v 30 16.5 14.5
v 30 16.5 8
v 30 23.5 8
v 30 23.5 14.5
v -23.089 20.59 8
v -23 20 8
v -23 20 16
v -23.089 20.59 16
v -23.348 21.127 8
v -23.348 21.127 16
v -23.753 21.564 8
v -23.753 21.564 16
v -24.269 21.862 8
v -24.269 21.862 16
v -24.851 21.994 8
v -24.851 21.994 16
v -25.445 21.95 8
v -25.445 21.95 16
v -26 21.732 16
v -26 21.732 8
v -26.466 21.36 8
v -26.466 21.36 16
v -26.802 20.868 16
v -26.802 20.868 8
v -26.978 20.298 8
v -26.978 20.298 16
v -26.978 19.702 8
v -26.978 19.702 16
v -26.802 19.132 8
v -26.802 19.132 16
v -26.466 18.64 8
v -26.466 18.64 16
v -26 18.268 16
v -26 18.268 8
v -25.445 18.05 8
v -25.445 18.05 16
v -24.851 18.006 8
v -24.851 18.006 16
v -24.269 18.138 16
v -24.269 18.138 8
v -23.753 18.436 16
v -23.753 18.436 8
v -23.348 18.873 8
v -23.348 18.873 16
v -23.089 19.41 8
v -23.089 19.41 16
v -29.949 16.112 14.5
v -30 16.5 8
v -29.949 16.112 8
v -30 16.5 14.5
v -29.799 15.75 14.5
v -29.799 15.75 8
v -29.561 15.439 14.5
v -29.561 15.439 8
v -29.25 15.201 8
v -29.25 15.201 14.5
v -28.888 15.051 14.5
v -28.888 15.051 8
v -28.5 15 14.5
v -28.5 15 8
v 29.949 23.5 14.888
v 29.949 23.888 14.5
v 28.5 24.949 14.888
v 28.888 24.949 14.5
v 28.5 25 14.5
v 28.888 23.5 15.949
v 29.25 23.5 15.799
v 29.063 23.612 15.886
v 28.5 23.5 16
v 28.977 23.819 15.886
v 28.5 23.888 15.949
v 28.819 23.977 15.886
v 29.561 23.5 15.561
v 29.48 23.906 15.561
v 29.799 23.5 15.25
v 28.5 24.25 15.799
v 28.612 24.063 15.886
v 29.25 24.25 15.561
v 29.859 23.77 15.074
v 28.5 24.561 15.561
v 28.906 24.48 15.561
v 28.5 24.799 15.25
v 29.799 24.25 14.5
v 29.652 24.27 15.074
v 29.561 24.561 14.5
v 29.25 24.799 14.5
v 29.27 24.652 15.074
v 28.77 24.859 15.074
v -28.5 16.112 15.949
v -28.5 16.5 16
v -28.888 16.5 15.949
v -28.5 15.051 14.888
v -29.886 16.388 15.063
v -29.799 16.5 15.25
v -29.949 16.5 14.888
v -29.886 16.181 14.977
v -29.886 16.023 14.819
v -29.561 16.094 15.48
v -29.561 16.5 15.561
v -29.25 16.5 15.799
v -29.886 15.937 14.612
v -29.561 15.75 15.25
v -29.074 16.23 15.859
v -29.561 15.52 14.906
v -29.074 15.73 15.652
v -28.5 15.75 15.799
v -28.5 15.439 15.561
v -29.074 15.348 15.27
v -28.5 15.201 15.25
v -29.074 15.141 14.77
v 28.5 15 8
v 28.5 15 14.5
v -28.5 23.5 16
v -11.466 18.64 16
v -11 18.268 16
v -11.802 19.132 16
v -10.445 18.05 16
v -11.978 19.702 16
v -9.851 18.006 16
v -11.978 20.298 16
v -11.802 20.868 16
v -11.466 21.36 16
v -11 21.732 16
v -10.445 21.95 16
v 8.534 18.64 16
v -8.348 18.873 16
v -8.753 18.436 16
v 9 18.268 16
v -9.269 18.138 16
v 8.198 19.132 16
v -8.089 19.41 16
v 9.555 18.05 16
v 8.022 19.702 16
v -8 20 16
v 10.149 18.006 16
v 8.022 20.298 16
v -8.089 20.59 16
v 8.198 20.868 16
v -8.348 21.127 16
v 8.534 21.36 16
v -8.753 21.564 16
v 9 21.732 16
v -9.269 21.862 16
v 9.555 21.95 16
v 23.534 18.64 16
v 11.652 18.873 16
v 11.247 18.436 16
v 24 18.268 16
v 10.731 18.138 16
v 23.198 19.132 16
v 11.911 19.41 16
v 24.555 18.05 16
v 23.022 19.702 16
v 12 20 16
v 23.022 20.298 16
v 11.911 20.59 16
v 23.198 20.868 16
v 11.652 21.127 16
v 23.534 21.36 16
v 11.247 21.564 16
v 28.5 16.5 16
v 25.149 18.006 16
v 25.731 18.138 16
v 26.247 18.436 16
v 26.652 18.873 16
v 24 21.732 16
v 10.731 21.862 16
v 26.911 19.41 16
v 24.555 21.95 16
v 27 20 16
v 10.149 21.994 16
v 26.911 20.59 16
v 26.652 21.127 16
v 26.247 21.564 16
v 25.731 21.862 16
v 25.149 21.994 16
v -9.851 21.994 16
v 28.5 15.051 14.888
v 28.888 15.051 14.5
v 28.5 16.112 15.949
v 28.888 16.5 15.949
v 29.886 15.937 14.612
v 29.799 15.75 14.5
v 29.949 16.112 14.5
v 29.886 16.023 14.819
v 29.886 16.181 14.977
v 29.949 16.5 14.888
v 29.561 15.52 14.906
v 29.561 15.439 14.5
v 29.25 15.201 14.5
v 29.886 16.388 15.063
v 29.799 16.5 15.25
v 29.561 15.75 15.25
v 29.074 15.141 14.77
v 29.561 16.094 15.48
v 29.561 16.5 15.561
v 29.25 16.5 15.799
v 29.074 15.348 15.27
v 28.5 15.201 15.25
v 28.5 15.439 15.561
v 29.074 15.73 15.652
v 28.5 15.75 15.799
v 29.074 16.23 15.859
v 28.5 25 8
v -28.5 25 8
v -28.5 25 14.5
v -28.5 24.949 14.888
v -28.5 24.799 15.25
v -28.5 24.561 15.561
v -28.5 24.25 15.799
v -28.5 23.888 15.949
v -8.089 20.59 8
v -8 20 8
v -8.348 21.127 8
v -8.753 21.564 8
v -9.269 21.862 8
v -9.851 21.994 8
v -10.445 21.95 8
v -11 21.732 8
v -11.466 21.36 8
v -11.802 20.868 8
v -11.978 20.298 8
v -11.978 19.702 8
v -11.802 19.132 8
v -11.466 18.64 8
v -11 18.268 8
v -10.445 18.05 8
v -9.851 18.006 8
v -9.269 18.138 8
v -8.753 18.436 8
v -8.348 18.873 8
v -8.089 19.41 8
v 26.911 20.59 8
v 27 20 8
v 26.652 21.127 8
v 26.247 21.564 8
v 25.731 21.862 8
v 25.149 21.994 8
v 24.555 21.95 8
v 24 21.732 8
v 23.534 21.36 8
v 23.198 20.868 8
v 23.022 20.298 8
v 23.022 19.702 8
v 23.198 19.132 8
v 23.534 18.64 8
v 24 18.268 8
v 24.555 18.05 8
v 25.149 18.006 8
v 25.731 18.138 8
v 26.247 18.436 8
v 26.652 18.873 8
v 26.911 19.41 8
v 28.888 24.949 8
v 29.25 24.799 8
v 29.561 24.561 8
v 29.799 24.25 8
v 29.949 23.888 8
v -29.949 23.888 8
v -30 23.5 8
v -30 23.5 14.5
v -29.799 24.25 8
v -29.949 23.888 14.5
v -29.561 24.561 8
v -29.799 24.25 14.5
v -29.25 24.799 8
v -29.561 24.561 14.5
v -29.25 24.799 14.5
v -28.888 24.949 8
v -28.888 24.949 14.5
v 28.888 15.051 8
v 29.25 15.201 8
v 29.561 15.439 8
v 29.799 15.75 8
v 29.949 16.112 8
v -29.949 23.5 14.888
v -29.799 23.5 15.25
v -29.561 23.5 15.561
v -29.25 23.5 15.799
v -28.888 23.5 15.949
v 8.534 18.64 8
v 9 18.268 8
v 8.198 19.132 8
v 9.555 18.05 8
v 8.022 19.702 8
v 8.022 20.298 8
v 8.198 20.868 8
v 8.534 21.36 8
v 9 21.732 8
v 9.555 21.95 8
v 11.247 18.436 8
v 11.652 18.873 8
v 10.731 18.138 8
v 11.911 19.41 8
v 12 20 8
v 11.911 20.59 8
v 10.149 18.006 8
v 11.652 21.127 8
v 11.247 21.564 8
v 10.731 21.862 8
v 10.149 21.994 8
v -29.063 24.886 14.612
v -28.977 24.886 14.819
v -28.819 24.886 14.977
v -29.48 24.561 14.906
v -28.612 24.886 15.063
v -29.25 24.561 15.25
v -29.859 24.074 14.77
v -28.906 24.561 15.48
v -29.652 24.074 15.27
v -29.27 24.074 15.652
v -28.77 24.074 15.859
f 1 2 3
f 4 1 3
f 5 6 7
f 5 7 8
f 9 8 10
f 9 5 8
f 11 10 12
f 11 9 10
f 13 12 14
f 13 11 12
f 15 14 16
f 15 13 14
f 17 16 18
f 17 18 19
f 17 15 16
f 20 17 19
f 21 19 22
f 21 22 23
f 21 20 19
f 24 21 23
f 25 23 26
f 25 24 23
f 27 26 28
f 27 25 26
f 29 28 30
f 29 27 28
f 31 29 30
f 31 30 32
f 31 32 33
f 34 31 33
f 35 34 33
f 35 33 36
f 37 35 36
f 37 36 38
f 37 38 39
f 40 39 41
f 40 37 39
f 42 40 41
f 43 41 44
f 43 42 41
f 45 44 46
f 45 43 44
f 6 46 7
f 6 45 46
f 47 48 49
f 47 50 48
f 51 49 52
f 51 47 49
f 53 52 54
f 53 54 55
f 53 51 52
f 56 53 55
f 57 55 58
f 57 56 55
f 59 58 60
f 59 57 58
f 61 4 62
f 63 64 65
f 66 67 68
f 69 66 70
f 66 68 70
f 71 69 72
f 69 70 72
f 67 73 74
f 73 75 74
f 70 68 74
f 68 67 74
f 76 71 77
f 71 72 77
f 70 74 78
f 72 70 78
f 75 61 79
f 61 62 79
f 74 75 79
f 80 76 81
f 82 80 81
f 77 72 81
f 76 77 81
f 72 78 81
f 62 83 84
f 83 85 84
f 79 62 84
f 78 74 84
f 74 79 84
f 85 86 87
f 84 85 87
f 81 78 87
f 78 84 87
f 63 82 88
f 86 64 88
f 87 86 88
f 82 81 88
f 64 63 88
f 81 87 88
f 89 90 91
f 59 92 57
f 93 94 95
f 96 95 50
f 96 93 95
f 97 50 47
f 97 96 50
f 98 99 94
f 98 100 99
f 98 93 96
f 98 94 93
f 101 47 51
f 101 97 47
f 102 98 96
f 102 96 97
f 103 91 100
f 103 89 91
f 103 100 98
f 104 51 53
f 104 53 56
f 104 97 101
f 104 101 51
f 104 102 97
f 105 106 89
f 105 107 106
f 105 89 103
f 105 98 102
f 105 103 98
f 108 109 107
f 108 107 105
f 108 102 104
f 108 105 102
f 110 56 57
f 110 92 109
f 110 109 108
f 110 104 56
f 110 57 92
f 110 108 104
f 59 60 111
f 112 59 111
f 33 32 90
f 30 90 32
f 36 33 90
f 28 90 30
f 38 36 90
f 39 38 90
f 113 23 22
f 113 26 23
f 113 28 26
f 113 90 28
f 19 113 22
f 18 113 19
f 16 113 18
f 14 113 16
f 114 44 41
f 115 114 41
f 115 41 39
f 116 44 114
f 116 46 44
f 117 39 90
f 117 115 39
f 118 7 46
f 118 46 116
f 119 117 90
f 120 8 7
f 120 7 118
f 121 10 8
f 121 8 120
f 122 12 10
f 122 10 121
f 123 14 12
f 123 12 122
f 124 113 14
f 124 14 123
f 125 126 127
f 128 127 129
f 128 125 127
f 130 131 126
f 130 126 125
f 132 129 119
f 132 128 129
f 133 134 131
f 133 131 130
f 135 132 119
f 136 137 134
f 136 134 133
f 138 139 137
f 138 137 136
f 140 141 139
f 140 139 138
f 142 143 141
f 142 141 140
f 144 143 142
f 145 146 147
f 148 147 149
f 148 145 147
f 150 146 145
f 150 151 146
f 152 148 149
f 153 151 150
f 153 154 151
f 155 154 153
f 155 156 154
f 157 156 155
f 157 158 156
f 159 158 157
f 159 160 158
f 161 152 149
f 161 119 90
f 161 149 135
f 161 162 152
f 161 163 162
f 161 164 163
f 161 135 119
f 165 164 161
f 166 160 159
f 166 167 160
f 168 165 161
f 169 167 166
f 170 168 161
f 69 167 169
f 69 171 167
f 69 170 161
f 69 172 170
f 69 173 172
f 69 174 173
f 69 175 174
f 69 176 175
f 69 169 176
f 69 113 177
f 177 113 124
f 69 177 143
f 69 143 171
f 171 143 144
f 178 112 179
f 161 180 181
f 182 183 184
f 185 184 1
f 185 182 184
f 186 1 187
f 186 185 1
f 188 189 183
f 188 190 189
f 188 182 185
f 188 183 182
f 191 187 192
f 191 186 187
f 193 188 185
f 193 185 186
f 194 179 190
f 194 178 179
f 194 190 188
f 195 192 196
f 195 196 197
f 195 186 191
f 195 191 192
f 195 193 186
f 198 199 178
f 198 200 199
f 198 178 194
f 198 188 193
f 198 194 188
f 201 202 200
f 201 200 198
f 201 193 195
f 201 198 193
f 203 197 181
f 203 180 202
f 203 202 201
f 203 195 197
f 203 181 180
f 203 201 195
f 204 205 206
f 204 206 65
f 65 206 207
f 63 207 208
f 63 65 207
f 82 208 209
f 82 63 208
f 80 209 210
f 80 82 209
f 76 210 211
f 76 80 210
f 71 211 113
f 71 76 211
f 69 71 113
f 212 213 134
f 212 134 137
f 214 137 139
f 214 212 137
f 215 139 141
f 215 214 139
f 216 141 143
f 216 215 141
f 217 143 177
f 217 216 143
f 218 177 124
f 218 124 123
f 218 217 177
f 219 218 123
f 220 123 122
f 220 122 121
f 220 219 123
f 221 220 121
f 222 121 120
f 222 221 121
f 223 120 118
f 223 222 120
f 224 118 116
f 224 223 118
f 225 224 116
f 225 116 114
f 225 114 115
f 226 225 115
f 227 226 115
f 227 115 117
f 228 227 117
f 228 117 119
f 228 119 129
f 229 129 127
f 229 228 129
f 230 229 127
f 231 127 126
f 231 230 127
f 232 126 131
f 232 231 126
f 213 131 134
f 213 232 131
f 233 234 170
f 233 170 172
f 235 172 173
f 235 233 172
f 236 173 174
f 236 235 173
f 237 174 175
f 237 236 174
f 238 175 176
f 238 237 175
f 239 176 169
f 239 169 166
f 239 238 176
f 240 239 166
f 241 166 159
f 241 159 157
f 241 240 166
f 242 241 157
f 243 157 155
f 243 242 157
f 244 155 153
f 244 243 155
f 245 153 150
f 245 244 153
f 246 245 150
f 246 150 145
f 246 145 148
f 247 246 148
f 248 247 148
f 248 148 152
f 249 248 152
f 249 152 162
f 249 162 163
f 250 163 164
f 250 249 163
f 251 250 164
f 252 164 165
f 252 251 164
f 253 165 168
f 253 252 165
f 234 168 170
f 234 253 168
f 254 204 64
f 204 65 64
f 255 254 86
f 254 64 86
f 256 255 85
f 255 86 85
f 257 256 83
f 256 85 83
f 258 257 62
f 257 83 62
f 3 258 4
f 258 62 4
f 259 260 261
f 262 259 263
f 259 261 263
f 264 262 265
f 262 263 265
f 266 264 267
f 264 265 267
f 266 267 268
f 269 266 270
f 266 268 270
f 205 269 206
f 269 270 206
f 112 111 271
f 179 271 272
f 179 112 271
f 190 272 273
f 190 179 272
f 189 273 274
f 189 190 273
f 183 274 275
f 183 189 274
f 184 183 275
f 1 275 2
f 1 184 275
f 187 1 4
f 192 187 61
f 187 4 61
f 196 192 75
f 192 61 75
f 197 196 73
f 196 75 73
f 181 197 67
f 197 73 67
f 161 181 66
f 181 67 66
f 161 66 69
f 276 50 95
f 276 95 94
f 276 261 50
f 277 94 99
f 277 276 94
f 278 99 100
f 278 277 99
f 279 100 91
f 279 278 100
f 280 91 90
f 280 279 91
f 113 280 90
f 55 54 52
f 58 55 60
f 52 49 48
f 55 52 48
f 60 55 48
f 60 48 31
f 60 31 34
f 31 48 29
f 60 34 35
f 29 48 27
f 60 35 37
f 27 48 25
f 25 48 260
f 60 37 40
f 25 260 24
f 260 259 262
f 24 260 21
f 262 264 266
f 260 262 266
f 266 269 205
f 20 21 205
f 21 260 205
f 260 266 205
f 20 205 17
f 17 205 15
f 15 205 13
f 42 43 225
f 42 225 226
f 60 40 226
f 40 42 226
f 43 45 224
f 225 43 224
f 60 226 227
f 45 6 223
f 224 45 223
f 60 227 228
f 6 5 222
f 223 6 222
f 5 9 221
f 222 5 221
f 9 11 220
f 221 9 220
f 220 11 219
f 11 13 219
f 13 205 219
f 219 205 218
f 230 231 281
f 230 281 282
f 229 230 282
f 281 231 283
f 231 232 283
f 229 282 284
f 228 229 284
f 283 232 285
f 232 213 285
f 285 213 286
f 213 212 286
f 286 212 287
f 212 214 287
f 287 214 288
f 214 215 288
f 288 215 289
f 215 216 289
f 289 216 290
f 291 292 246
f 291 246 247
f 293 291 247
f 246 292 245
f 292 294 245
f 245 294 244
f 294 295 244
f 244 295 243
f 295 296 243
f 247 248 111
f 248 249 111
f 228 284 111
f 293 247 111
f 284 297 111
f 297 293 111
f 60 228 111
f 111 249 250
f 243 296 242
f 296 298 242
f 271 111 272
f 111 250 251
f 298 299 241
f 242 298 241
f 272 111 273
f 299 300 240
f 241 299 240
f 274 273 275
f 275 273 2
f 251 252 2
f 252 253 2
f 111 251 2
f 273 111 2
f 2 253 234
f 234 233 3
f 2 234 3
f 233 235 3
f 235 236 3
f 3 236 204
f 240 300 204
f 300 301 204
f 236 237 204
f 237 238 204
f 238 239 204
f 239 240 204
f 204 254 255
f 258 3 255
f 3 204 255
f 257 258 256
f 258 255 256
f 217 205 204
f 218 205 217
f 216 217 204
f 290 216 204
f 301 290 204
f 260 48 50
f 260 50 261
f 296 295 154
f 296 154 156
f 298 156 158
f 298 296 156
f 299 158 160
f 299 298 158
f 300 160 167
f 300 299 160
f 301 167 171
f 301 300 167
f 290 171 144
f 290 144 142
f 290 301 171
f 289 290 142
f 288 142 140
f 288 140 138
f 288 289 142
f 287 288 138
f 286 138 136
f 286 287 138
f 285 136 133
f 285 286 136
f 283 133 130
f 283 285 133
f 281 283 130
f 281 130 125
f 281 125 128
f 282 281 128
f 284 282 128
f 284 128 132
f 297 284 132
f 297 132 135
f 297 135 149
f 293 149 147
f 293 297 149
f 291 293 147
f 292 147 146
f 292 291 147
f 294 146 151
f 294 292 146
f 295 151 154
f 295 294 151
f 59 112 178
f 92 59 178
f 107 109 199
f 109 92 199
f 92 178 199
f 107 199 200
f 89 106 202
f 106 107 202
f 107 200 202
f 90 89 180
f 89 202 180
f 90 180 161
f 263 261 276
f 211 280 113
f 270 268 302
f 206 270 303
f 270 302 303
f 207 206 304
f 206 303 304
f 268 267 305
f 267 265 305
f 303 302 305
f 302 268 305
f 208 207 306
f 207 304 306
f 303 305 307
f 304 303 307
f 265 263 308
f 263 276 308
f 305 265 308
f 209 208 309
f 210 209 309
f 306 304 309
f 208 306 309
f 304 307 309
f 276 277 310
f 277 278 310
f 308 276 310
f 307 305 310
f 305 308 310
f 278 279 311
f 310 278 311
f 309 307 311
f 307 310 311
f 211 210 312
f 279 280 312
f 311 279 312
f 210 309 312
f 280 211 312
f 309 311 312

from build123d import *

# Parameters (mm, degrees)
F0_R      = 2
F1_DEPTH  = 10
F2_R      = 5
F4_R      = 2
F5_DEPTH  = 10
F7_R      = 5
F7_2_R    = 5
F8_R      = 2
F8_2_R    = 2
F10_DEPTH = 25
F11_R     = 1.5
F12_R     = 1.75
F13_DEPTH = 12.5
F15_W     = 9
F15_H     = 20
F16_DEPTH = 10
F17_W     = 6
F17_H     = 20
F18_DEPTH = 25
F21_R     = 2
F22_DEPTH = 30
F24_R     = 2
F25_DEPTH = 12.5
F27_R     = 2
F28_R     = 2
F29_DEPTH = 8
F30_R     = 2
F31_R     = 2
F32_R     = 1.75
F33_DEPTH = 25
F32_R_2   = 2
F37_ANGLE = 90
F40_W     = 60
F40_H     = 10
F40_R     = 2
F41_DEPTH = 8
F43_R     = 1.5


with BuildPart() as f1:
    # F0 (on Top) → F1 (new body)
    with BuildSketch(Plane.XY):
        Polygon((0, 70), (0, 75), (-20, 75), (-30, 75), (-50, -75), (-40, -75), (0, -75), (0, -65), (-38.6666666667, -65), (-30.8, -6), (0, -6), (0, 0), (0, 6), (-29.2, 6), (-21.3333333333, 65), (0, 65), align=None)
        with Locations((-15, 0)):
            Circle(F0_R, mode=Mode.SUBTRACT)
        with Locations((-10.4101235047, 70)):
            Circle(F0_R, mode=Mode.SUBTRACT)
    extrude(amount=F1_DEPTH)

    # F2
    f2_edges = [f1.edges().sort_by_distance(p)[0] for p in [
        (-21.333333, 65, 5),
        (-30.8, -6, 5),
        (-29.2, 6, 5),
        (-38.666667, -65, 5),
        (-50, -75, 5),
    ]]
    fillet(f2_edges, radius=F2_R)

    # F3: F1 across plane


with BuildPart() as f1_1:
    add(f1.part)
    add(f1.part.mirror(Plane.YZ))

    # F4 (on Top) → F5 (join)
    with BuildSketch(Plane.XY):
        with BuildLine():
            Line((0, 80), (0, 75))
            Line((0, 75), (10, 75))
            Line((10, 75), (30, 75))
            Line((30, 75), (13.3333333333, 200))
            Line((13.3333333333, 200), (4.5, 200))
            Line((4.5, 200), (4.5, 192))
            ThreePointArc((4.5, 192), (3.1819805153, 188.8180194847), (0, 187.5))
            Line((0, 187.5), (0, 170.1721444783))
            Line((0, 170.1721444783), (7.3103807362, 170.1721444783))
            Line((7.3103807362, 170.1721444783), (10, 150))
            Line((10, 150), (18.6666666667, 85))
            Line((18.6666666667, 85), (10, 85))
            Line((10, 85), (0, 85))
            Line((0, 85), (0, 80))
        make_face()
        with Locations((10, 80)):
            Circle(F4_R, mode=Mode.SUBTRACT)
    extrude(amount=F5_DEPTH)


with BuildPart() as f6_1:
    # F6: instance of F1
    add(f1_1.part.mirror(Plane.YZ))

    # F7
    f7_edges = [f6_1.edges().sort_by_distance(p)[0] for p in [
        (-7.310381, 170.172144, 5),
        (-18.666667, 85, 5),
        (-13.333333, 200, 5),
    ]]
    fillet(f7_edges, radius=F7_R)

    # F8#2
    f8_2_edges = [f6_1.edges().sort_by_distance(p)[0] for p in [
        (-4.5, 200, 5),
    ]]
    fillet(f8_2_edges, radius=F8_2_R)


with BuildPart() as f1_2:
    add(f1_1.part)

    # F7#2
    f7_2_edges = [f1_2.edges().sort_by_distance(p)[0] for p in [
        (7.310381, 170.172144, 5),
        (18.666667, 85, 5),
        (13.333333, 200, 5),
    ]]
    fillet(f7_2_edges, radius=F7_2_R)

    # F8
    f8_edges = [f1_2.edges().sort_by_distance(p)[0] for p in [
        (4.5, 200, 5),
    ]]
    fillet(f8_edges, radius=F8_R)

    add(f6_1.part)  # F10 merges F6_1
    # F9 (on Top) → F10 (join)
    with BuildSketch(Plane.XY):
        Polygon((0, -6), (0, 0), (0, 6), (-6, 6), (-6, -6), align=None)
    extrude(amount=F10_DEPTH)

    # F11
    f11_edges = [f1_2.edges().sort_by_distance(p)[0] for p in [
        (-6, -6, 17.5),
        (-6, 0, 25),
        (-3, -6, 25),
        (-6, 6, 17.5),
        (-3, 6, 25),
    ]]
    fillet(f11_edges, radius=F11_R)


with BuildPart() as f13:
    # F12 (on Right) → F13 (new body, symmetric)
    with BuildSketch(Plane.YZ):
        with Locations((0, 20)):
            Circle(F12_R)
    extrude(amount=F13_DEPTH, both=True)


with BuildPart() as f13b:
    # F12 (on Right) → F13, piece 2 (new body, symmetric)
    with BuildSketch(Plane.YZ):
        with Locations((0, 15)):
            Circle(F12_R)
    extrude(amount=F13_DEPTH, both=True)


with BuildPart() as f1_3:
    add(f1_2.part)

    # F14: cut F13b, F13
    add(f13b.part, mode=Mode.SUBTRACT)
    add(f13.part, mode=Mode.SUBTRACT)


with BuildPart() as f16:
    # F15 (on Top) → F16 (new body)
    with BuildSketch(Plane.XY):
        Polygon((0, 65), (15, 65), (15, 85), (0, 85), (0, 75), align=None)
        Polygon((-6, 65), (0, 65), (0, 75), (0, 85), (-6, 85), align=None)
        with Locations((-10.5, 75)):
            Rectangle(F15_W, F15_H)
    extrude(amount=F16_DEPTH)


with BuildPart() as f18:
    # F17 (on Top) → F18 (new body)
    with BuildSketch(Plane.XY):
        with Locations((-3, 75)):
            Rectangle(F17_W, F17_H)
    extrude(amount=F18_DEPTH)


with BuildPart() as f16_1:
    add(f16.part)

    # F19: union F18
    add(f18.part)


with BuildPart() as f16_2:
    # F20: moved
    add(f16_1.part.moved(Location((0, 0, 10))))


with BuildPart() as f22:
    # F21 (on Top) → F22 (new body)
    with BuildSketch(Plane.XY):
        with Locations((-10, 80)):
            Circle(F21_R)
    extrude(amount=F22_DEPTH)


with BuildPart() as f22b:
    # F21 (on Top) → F22, piece 2 (new body)
    with BuildSketch(Plane.XY):
        with Locations((10, 80)):
            Circle(F21_R)
    extrude(amount=F22_DEPTH)


with BuildPart() as f22c:
    # F21 (on Top) → F22, piece 3 (new body)
    with BuildSketch(Plane.XY):
        with Locations((-10.4, 70)):
            Circle(F21_R)
    extrude(amount=F22_DEPTH)


with BuildPart() as f22d:
    # F21 (on Top) → F22, piece 4 (new body)
    with BuildSketch(Plane.XY):
        with Locations((10.4, 70)):
            Circle(F21_R)
    extrude(amount=F22_DEPTH)


with BuildPart() as f16_3:
    add(f16_2.part)

    # F23: cut F22d, F22c, F22b, F22
    add(f22d.part, mode=Mode.SUBTRACT)
    add(f22c.part, mode=Mode.SUBTRACT)
    add(f22b.part, mode=Mode.SUBTRACT)
    add(f22.part, mode=Mode.SUBTRACT)


with BuildPart() as f25:
    # F24 (on Right) → F25 (new body, symmetric)
    with BuildSketch(Plane.YZ):
        with Locations((80, 27.2266920656)):
            Circle(F24_R)
    extrude(amount=F25_DEPTH, both=True)


with BuildPart() as f25b:
    # F24 (on Right) → F25, piece 2 (new body, symmetric)
    with BuildSketch(Plane.YZ):
        with Locations((70, 27.2266920656)):
            Circle(F24_R)
    extrude(amount=F25_DEPTH, both=True)


with BuildPart() as f16_4:
    add(f16_3.part)

    # F26: cut F25b, F25
    add(f25b.part, mode=Mode.SUBTRACT)
    add(f25.part, mode=Mode.SUBTRACT)

    # F27
    f27_edges = [f16_4.edges().sort_by_distance(p)[0] for p in [
        (-6, 65, 27.5),
        (-3, 65, 35),
        (-10.5, 65, 20),
        (-15, 65, 15),
        (7.5, 65, 20),
        (15, 65, 15),
        (15, 75, 10),
        (-15, 75, 10),
        (-6, 75, 35),
        (-10.5, 85, 20),
        (-15, 85, 15),
        (-6, 85, 27.5),
        (-3, 85, 35),
        (7.5, 85, 20),
        (15, 85, 15),
    ]]
    fillet(f27_edges, radius=F27_R)


with BuildPart() as f29:
    # F28 (on Right) → F29 (new body)
    with BuildSketch(Plane.YZ):
        Polygon((-6, 10), (0, 10), (6, 10), (6, 25), (65, 35), (65, 20), (75, 20), (85, 20), (85, 35), (85, 120), (75, 120), (-6, 25), align=None)
        Polygon((17.4430621123, 37.0821219176), (23.9249371816, 44.6843210729), (75, 104.5871725266), (75, 45), (64.1585427985, 45), (51.9163602293, 42.9250538018), align=None, mode=Mode.SUBTRACT)
        with Locations((80, 95)):
            Circle(F28_R, mode=Mode.SUBTRACT)
        with Locations((80, 110)):
            Circle(F28_R, mode=Mode.SUBTRACT)
    extrude(amount=F29_DEPTH)

    # F30
    f30_edges = [f29.edges().sort_by_distance(p)[0] for p in [
        (4, 75, 104.587173),
        (4, 75, 45),
        (4, 17.443062, 37.082122),
        (4, 65, 35),
        (4, 6, 25),
        (4, -6, 25),
    ]]
    fillet(f30_edges, radius=F30_R)

    # F31
    f31_edges = [f29.edges().sort_by_distance(p)[0] for p in [
        (8, 46.246648, 70.864105),
        (8, 34.73905, 72.780367),
        (8, 35.165784, 29.943353),
        (8, 85, 70),
    ]]
    fillet(f31_edges, radius=F31_R)


with BuildPart() as f33:
    # F32 (on Right) → F33 (new body)
    with BuildSketch(Plane.YZ):
        with Locations((0, 20)):
            Circle(F32_R)
    extrude(amount=F33_DEPTH)


with BuildPart() as f33b:
    # F32 (on Right) → F33, piece 2 (new body)
    with BuildSketch(Plane.YZ):
        with Locations((0, 15)):
            Circle(F32_R)
    extrude(amount=F33_DEPTH)


with BuildPart() as f33c:
    # F32 (on Right) → F33, piece 3 (new body)
    with BuildSketch(Plane.YZ):
        with Locations((70, 27.25)):
            Circle(F32_R_2)
    extrude(amount=F33_DEPTH)


with BuildPart() as f33d:
    # F32 (on Right) → F33, piece 4 (new body)
    with BuildSketch(Plane.YZ):
        with Locations((80, 27.25)):
            Circle(F32_R_2)
    extrude(amount=F33_DEPTH)


with BuildPart() as f29_1:
    add(f29.part)

    # F34: cut F33d, F33c, F33b, F33
    add(f33d.part, mode=Mode.SUBTRACT)
    add(f33c.part, mode=Mode.SUBTRACT)
    add(f33b.part, mode=Mode.SUBTRACT)
    add(f33.part, mode=Mode.SUBTRACT)


with BuildPart() as f29_2:
    # F37: moved
    add(f29_1.part.rotate(Axis((0, -39.3833108246, 0), (0, -1, 0)), F37_ANGLE))


with BuildPart() as f29_3:
    # F38: moved
    add(f29_2.part.moved(Location((120, -60, 0))))


with BuildPart() as f39_1:
    # F39: instance of F29
    add(f29_3.part.mirror(Plane.YZ))


with BuildPart() as f41:
    # F40 (on Top) → F41 (new body)
    with BuildSketch(Plane.XY):
        with Locations((0, 20)):
            Rectangle(F40_W, F40_H)
        with Locations((-25, 20)):
            Circle(F40_R, mode=Mode.SUBTRACT)
        with Locations((-10, 20)):
            Circle(F40_R, mode=Mode.SUBTRACT)
        with Locations((10, 20)):
            Circle(F40_R, mode=Mode.SUBTRACT)
        with Locations((25, 20)):
            Circle(F40_R, mode=Mode.SUBTRACT)
    extrude(amount=F41_DEPTH)


with BuildPart() as f41_1:
    # F42: moved
    add(f41.part.moved(Location((0, 0, 8))))

    # F43
    f43_edges = [f41_1.edges().sort_by_distance(p)[0] for p in [
        (0, 15, 16),
        (30, 15, 12),
        (30, 25, 12),
        (30, 20, 16),
        (-30, 20, 16),
        (-30, 15, 12),
        (-30, 25, 12),
        (0, 25, 16),
    ]]
    fillet(f43_edges, radius=F43_R)


solid = f41_1.part
